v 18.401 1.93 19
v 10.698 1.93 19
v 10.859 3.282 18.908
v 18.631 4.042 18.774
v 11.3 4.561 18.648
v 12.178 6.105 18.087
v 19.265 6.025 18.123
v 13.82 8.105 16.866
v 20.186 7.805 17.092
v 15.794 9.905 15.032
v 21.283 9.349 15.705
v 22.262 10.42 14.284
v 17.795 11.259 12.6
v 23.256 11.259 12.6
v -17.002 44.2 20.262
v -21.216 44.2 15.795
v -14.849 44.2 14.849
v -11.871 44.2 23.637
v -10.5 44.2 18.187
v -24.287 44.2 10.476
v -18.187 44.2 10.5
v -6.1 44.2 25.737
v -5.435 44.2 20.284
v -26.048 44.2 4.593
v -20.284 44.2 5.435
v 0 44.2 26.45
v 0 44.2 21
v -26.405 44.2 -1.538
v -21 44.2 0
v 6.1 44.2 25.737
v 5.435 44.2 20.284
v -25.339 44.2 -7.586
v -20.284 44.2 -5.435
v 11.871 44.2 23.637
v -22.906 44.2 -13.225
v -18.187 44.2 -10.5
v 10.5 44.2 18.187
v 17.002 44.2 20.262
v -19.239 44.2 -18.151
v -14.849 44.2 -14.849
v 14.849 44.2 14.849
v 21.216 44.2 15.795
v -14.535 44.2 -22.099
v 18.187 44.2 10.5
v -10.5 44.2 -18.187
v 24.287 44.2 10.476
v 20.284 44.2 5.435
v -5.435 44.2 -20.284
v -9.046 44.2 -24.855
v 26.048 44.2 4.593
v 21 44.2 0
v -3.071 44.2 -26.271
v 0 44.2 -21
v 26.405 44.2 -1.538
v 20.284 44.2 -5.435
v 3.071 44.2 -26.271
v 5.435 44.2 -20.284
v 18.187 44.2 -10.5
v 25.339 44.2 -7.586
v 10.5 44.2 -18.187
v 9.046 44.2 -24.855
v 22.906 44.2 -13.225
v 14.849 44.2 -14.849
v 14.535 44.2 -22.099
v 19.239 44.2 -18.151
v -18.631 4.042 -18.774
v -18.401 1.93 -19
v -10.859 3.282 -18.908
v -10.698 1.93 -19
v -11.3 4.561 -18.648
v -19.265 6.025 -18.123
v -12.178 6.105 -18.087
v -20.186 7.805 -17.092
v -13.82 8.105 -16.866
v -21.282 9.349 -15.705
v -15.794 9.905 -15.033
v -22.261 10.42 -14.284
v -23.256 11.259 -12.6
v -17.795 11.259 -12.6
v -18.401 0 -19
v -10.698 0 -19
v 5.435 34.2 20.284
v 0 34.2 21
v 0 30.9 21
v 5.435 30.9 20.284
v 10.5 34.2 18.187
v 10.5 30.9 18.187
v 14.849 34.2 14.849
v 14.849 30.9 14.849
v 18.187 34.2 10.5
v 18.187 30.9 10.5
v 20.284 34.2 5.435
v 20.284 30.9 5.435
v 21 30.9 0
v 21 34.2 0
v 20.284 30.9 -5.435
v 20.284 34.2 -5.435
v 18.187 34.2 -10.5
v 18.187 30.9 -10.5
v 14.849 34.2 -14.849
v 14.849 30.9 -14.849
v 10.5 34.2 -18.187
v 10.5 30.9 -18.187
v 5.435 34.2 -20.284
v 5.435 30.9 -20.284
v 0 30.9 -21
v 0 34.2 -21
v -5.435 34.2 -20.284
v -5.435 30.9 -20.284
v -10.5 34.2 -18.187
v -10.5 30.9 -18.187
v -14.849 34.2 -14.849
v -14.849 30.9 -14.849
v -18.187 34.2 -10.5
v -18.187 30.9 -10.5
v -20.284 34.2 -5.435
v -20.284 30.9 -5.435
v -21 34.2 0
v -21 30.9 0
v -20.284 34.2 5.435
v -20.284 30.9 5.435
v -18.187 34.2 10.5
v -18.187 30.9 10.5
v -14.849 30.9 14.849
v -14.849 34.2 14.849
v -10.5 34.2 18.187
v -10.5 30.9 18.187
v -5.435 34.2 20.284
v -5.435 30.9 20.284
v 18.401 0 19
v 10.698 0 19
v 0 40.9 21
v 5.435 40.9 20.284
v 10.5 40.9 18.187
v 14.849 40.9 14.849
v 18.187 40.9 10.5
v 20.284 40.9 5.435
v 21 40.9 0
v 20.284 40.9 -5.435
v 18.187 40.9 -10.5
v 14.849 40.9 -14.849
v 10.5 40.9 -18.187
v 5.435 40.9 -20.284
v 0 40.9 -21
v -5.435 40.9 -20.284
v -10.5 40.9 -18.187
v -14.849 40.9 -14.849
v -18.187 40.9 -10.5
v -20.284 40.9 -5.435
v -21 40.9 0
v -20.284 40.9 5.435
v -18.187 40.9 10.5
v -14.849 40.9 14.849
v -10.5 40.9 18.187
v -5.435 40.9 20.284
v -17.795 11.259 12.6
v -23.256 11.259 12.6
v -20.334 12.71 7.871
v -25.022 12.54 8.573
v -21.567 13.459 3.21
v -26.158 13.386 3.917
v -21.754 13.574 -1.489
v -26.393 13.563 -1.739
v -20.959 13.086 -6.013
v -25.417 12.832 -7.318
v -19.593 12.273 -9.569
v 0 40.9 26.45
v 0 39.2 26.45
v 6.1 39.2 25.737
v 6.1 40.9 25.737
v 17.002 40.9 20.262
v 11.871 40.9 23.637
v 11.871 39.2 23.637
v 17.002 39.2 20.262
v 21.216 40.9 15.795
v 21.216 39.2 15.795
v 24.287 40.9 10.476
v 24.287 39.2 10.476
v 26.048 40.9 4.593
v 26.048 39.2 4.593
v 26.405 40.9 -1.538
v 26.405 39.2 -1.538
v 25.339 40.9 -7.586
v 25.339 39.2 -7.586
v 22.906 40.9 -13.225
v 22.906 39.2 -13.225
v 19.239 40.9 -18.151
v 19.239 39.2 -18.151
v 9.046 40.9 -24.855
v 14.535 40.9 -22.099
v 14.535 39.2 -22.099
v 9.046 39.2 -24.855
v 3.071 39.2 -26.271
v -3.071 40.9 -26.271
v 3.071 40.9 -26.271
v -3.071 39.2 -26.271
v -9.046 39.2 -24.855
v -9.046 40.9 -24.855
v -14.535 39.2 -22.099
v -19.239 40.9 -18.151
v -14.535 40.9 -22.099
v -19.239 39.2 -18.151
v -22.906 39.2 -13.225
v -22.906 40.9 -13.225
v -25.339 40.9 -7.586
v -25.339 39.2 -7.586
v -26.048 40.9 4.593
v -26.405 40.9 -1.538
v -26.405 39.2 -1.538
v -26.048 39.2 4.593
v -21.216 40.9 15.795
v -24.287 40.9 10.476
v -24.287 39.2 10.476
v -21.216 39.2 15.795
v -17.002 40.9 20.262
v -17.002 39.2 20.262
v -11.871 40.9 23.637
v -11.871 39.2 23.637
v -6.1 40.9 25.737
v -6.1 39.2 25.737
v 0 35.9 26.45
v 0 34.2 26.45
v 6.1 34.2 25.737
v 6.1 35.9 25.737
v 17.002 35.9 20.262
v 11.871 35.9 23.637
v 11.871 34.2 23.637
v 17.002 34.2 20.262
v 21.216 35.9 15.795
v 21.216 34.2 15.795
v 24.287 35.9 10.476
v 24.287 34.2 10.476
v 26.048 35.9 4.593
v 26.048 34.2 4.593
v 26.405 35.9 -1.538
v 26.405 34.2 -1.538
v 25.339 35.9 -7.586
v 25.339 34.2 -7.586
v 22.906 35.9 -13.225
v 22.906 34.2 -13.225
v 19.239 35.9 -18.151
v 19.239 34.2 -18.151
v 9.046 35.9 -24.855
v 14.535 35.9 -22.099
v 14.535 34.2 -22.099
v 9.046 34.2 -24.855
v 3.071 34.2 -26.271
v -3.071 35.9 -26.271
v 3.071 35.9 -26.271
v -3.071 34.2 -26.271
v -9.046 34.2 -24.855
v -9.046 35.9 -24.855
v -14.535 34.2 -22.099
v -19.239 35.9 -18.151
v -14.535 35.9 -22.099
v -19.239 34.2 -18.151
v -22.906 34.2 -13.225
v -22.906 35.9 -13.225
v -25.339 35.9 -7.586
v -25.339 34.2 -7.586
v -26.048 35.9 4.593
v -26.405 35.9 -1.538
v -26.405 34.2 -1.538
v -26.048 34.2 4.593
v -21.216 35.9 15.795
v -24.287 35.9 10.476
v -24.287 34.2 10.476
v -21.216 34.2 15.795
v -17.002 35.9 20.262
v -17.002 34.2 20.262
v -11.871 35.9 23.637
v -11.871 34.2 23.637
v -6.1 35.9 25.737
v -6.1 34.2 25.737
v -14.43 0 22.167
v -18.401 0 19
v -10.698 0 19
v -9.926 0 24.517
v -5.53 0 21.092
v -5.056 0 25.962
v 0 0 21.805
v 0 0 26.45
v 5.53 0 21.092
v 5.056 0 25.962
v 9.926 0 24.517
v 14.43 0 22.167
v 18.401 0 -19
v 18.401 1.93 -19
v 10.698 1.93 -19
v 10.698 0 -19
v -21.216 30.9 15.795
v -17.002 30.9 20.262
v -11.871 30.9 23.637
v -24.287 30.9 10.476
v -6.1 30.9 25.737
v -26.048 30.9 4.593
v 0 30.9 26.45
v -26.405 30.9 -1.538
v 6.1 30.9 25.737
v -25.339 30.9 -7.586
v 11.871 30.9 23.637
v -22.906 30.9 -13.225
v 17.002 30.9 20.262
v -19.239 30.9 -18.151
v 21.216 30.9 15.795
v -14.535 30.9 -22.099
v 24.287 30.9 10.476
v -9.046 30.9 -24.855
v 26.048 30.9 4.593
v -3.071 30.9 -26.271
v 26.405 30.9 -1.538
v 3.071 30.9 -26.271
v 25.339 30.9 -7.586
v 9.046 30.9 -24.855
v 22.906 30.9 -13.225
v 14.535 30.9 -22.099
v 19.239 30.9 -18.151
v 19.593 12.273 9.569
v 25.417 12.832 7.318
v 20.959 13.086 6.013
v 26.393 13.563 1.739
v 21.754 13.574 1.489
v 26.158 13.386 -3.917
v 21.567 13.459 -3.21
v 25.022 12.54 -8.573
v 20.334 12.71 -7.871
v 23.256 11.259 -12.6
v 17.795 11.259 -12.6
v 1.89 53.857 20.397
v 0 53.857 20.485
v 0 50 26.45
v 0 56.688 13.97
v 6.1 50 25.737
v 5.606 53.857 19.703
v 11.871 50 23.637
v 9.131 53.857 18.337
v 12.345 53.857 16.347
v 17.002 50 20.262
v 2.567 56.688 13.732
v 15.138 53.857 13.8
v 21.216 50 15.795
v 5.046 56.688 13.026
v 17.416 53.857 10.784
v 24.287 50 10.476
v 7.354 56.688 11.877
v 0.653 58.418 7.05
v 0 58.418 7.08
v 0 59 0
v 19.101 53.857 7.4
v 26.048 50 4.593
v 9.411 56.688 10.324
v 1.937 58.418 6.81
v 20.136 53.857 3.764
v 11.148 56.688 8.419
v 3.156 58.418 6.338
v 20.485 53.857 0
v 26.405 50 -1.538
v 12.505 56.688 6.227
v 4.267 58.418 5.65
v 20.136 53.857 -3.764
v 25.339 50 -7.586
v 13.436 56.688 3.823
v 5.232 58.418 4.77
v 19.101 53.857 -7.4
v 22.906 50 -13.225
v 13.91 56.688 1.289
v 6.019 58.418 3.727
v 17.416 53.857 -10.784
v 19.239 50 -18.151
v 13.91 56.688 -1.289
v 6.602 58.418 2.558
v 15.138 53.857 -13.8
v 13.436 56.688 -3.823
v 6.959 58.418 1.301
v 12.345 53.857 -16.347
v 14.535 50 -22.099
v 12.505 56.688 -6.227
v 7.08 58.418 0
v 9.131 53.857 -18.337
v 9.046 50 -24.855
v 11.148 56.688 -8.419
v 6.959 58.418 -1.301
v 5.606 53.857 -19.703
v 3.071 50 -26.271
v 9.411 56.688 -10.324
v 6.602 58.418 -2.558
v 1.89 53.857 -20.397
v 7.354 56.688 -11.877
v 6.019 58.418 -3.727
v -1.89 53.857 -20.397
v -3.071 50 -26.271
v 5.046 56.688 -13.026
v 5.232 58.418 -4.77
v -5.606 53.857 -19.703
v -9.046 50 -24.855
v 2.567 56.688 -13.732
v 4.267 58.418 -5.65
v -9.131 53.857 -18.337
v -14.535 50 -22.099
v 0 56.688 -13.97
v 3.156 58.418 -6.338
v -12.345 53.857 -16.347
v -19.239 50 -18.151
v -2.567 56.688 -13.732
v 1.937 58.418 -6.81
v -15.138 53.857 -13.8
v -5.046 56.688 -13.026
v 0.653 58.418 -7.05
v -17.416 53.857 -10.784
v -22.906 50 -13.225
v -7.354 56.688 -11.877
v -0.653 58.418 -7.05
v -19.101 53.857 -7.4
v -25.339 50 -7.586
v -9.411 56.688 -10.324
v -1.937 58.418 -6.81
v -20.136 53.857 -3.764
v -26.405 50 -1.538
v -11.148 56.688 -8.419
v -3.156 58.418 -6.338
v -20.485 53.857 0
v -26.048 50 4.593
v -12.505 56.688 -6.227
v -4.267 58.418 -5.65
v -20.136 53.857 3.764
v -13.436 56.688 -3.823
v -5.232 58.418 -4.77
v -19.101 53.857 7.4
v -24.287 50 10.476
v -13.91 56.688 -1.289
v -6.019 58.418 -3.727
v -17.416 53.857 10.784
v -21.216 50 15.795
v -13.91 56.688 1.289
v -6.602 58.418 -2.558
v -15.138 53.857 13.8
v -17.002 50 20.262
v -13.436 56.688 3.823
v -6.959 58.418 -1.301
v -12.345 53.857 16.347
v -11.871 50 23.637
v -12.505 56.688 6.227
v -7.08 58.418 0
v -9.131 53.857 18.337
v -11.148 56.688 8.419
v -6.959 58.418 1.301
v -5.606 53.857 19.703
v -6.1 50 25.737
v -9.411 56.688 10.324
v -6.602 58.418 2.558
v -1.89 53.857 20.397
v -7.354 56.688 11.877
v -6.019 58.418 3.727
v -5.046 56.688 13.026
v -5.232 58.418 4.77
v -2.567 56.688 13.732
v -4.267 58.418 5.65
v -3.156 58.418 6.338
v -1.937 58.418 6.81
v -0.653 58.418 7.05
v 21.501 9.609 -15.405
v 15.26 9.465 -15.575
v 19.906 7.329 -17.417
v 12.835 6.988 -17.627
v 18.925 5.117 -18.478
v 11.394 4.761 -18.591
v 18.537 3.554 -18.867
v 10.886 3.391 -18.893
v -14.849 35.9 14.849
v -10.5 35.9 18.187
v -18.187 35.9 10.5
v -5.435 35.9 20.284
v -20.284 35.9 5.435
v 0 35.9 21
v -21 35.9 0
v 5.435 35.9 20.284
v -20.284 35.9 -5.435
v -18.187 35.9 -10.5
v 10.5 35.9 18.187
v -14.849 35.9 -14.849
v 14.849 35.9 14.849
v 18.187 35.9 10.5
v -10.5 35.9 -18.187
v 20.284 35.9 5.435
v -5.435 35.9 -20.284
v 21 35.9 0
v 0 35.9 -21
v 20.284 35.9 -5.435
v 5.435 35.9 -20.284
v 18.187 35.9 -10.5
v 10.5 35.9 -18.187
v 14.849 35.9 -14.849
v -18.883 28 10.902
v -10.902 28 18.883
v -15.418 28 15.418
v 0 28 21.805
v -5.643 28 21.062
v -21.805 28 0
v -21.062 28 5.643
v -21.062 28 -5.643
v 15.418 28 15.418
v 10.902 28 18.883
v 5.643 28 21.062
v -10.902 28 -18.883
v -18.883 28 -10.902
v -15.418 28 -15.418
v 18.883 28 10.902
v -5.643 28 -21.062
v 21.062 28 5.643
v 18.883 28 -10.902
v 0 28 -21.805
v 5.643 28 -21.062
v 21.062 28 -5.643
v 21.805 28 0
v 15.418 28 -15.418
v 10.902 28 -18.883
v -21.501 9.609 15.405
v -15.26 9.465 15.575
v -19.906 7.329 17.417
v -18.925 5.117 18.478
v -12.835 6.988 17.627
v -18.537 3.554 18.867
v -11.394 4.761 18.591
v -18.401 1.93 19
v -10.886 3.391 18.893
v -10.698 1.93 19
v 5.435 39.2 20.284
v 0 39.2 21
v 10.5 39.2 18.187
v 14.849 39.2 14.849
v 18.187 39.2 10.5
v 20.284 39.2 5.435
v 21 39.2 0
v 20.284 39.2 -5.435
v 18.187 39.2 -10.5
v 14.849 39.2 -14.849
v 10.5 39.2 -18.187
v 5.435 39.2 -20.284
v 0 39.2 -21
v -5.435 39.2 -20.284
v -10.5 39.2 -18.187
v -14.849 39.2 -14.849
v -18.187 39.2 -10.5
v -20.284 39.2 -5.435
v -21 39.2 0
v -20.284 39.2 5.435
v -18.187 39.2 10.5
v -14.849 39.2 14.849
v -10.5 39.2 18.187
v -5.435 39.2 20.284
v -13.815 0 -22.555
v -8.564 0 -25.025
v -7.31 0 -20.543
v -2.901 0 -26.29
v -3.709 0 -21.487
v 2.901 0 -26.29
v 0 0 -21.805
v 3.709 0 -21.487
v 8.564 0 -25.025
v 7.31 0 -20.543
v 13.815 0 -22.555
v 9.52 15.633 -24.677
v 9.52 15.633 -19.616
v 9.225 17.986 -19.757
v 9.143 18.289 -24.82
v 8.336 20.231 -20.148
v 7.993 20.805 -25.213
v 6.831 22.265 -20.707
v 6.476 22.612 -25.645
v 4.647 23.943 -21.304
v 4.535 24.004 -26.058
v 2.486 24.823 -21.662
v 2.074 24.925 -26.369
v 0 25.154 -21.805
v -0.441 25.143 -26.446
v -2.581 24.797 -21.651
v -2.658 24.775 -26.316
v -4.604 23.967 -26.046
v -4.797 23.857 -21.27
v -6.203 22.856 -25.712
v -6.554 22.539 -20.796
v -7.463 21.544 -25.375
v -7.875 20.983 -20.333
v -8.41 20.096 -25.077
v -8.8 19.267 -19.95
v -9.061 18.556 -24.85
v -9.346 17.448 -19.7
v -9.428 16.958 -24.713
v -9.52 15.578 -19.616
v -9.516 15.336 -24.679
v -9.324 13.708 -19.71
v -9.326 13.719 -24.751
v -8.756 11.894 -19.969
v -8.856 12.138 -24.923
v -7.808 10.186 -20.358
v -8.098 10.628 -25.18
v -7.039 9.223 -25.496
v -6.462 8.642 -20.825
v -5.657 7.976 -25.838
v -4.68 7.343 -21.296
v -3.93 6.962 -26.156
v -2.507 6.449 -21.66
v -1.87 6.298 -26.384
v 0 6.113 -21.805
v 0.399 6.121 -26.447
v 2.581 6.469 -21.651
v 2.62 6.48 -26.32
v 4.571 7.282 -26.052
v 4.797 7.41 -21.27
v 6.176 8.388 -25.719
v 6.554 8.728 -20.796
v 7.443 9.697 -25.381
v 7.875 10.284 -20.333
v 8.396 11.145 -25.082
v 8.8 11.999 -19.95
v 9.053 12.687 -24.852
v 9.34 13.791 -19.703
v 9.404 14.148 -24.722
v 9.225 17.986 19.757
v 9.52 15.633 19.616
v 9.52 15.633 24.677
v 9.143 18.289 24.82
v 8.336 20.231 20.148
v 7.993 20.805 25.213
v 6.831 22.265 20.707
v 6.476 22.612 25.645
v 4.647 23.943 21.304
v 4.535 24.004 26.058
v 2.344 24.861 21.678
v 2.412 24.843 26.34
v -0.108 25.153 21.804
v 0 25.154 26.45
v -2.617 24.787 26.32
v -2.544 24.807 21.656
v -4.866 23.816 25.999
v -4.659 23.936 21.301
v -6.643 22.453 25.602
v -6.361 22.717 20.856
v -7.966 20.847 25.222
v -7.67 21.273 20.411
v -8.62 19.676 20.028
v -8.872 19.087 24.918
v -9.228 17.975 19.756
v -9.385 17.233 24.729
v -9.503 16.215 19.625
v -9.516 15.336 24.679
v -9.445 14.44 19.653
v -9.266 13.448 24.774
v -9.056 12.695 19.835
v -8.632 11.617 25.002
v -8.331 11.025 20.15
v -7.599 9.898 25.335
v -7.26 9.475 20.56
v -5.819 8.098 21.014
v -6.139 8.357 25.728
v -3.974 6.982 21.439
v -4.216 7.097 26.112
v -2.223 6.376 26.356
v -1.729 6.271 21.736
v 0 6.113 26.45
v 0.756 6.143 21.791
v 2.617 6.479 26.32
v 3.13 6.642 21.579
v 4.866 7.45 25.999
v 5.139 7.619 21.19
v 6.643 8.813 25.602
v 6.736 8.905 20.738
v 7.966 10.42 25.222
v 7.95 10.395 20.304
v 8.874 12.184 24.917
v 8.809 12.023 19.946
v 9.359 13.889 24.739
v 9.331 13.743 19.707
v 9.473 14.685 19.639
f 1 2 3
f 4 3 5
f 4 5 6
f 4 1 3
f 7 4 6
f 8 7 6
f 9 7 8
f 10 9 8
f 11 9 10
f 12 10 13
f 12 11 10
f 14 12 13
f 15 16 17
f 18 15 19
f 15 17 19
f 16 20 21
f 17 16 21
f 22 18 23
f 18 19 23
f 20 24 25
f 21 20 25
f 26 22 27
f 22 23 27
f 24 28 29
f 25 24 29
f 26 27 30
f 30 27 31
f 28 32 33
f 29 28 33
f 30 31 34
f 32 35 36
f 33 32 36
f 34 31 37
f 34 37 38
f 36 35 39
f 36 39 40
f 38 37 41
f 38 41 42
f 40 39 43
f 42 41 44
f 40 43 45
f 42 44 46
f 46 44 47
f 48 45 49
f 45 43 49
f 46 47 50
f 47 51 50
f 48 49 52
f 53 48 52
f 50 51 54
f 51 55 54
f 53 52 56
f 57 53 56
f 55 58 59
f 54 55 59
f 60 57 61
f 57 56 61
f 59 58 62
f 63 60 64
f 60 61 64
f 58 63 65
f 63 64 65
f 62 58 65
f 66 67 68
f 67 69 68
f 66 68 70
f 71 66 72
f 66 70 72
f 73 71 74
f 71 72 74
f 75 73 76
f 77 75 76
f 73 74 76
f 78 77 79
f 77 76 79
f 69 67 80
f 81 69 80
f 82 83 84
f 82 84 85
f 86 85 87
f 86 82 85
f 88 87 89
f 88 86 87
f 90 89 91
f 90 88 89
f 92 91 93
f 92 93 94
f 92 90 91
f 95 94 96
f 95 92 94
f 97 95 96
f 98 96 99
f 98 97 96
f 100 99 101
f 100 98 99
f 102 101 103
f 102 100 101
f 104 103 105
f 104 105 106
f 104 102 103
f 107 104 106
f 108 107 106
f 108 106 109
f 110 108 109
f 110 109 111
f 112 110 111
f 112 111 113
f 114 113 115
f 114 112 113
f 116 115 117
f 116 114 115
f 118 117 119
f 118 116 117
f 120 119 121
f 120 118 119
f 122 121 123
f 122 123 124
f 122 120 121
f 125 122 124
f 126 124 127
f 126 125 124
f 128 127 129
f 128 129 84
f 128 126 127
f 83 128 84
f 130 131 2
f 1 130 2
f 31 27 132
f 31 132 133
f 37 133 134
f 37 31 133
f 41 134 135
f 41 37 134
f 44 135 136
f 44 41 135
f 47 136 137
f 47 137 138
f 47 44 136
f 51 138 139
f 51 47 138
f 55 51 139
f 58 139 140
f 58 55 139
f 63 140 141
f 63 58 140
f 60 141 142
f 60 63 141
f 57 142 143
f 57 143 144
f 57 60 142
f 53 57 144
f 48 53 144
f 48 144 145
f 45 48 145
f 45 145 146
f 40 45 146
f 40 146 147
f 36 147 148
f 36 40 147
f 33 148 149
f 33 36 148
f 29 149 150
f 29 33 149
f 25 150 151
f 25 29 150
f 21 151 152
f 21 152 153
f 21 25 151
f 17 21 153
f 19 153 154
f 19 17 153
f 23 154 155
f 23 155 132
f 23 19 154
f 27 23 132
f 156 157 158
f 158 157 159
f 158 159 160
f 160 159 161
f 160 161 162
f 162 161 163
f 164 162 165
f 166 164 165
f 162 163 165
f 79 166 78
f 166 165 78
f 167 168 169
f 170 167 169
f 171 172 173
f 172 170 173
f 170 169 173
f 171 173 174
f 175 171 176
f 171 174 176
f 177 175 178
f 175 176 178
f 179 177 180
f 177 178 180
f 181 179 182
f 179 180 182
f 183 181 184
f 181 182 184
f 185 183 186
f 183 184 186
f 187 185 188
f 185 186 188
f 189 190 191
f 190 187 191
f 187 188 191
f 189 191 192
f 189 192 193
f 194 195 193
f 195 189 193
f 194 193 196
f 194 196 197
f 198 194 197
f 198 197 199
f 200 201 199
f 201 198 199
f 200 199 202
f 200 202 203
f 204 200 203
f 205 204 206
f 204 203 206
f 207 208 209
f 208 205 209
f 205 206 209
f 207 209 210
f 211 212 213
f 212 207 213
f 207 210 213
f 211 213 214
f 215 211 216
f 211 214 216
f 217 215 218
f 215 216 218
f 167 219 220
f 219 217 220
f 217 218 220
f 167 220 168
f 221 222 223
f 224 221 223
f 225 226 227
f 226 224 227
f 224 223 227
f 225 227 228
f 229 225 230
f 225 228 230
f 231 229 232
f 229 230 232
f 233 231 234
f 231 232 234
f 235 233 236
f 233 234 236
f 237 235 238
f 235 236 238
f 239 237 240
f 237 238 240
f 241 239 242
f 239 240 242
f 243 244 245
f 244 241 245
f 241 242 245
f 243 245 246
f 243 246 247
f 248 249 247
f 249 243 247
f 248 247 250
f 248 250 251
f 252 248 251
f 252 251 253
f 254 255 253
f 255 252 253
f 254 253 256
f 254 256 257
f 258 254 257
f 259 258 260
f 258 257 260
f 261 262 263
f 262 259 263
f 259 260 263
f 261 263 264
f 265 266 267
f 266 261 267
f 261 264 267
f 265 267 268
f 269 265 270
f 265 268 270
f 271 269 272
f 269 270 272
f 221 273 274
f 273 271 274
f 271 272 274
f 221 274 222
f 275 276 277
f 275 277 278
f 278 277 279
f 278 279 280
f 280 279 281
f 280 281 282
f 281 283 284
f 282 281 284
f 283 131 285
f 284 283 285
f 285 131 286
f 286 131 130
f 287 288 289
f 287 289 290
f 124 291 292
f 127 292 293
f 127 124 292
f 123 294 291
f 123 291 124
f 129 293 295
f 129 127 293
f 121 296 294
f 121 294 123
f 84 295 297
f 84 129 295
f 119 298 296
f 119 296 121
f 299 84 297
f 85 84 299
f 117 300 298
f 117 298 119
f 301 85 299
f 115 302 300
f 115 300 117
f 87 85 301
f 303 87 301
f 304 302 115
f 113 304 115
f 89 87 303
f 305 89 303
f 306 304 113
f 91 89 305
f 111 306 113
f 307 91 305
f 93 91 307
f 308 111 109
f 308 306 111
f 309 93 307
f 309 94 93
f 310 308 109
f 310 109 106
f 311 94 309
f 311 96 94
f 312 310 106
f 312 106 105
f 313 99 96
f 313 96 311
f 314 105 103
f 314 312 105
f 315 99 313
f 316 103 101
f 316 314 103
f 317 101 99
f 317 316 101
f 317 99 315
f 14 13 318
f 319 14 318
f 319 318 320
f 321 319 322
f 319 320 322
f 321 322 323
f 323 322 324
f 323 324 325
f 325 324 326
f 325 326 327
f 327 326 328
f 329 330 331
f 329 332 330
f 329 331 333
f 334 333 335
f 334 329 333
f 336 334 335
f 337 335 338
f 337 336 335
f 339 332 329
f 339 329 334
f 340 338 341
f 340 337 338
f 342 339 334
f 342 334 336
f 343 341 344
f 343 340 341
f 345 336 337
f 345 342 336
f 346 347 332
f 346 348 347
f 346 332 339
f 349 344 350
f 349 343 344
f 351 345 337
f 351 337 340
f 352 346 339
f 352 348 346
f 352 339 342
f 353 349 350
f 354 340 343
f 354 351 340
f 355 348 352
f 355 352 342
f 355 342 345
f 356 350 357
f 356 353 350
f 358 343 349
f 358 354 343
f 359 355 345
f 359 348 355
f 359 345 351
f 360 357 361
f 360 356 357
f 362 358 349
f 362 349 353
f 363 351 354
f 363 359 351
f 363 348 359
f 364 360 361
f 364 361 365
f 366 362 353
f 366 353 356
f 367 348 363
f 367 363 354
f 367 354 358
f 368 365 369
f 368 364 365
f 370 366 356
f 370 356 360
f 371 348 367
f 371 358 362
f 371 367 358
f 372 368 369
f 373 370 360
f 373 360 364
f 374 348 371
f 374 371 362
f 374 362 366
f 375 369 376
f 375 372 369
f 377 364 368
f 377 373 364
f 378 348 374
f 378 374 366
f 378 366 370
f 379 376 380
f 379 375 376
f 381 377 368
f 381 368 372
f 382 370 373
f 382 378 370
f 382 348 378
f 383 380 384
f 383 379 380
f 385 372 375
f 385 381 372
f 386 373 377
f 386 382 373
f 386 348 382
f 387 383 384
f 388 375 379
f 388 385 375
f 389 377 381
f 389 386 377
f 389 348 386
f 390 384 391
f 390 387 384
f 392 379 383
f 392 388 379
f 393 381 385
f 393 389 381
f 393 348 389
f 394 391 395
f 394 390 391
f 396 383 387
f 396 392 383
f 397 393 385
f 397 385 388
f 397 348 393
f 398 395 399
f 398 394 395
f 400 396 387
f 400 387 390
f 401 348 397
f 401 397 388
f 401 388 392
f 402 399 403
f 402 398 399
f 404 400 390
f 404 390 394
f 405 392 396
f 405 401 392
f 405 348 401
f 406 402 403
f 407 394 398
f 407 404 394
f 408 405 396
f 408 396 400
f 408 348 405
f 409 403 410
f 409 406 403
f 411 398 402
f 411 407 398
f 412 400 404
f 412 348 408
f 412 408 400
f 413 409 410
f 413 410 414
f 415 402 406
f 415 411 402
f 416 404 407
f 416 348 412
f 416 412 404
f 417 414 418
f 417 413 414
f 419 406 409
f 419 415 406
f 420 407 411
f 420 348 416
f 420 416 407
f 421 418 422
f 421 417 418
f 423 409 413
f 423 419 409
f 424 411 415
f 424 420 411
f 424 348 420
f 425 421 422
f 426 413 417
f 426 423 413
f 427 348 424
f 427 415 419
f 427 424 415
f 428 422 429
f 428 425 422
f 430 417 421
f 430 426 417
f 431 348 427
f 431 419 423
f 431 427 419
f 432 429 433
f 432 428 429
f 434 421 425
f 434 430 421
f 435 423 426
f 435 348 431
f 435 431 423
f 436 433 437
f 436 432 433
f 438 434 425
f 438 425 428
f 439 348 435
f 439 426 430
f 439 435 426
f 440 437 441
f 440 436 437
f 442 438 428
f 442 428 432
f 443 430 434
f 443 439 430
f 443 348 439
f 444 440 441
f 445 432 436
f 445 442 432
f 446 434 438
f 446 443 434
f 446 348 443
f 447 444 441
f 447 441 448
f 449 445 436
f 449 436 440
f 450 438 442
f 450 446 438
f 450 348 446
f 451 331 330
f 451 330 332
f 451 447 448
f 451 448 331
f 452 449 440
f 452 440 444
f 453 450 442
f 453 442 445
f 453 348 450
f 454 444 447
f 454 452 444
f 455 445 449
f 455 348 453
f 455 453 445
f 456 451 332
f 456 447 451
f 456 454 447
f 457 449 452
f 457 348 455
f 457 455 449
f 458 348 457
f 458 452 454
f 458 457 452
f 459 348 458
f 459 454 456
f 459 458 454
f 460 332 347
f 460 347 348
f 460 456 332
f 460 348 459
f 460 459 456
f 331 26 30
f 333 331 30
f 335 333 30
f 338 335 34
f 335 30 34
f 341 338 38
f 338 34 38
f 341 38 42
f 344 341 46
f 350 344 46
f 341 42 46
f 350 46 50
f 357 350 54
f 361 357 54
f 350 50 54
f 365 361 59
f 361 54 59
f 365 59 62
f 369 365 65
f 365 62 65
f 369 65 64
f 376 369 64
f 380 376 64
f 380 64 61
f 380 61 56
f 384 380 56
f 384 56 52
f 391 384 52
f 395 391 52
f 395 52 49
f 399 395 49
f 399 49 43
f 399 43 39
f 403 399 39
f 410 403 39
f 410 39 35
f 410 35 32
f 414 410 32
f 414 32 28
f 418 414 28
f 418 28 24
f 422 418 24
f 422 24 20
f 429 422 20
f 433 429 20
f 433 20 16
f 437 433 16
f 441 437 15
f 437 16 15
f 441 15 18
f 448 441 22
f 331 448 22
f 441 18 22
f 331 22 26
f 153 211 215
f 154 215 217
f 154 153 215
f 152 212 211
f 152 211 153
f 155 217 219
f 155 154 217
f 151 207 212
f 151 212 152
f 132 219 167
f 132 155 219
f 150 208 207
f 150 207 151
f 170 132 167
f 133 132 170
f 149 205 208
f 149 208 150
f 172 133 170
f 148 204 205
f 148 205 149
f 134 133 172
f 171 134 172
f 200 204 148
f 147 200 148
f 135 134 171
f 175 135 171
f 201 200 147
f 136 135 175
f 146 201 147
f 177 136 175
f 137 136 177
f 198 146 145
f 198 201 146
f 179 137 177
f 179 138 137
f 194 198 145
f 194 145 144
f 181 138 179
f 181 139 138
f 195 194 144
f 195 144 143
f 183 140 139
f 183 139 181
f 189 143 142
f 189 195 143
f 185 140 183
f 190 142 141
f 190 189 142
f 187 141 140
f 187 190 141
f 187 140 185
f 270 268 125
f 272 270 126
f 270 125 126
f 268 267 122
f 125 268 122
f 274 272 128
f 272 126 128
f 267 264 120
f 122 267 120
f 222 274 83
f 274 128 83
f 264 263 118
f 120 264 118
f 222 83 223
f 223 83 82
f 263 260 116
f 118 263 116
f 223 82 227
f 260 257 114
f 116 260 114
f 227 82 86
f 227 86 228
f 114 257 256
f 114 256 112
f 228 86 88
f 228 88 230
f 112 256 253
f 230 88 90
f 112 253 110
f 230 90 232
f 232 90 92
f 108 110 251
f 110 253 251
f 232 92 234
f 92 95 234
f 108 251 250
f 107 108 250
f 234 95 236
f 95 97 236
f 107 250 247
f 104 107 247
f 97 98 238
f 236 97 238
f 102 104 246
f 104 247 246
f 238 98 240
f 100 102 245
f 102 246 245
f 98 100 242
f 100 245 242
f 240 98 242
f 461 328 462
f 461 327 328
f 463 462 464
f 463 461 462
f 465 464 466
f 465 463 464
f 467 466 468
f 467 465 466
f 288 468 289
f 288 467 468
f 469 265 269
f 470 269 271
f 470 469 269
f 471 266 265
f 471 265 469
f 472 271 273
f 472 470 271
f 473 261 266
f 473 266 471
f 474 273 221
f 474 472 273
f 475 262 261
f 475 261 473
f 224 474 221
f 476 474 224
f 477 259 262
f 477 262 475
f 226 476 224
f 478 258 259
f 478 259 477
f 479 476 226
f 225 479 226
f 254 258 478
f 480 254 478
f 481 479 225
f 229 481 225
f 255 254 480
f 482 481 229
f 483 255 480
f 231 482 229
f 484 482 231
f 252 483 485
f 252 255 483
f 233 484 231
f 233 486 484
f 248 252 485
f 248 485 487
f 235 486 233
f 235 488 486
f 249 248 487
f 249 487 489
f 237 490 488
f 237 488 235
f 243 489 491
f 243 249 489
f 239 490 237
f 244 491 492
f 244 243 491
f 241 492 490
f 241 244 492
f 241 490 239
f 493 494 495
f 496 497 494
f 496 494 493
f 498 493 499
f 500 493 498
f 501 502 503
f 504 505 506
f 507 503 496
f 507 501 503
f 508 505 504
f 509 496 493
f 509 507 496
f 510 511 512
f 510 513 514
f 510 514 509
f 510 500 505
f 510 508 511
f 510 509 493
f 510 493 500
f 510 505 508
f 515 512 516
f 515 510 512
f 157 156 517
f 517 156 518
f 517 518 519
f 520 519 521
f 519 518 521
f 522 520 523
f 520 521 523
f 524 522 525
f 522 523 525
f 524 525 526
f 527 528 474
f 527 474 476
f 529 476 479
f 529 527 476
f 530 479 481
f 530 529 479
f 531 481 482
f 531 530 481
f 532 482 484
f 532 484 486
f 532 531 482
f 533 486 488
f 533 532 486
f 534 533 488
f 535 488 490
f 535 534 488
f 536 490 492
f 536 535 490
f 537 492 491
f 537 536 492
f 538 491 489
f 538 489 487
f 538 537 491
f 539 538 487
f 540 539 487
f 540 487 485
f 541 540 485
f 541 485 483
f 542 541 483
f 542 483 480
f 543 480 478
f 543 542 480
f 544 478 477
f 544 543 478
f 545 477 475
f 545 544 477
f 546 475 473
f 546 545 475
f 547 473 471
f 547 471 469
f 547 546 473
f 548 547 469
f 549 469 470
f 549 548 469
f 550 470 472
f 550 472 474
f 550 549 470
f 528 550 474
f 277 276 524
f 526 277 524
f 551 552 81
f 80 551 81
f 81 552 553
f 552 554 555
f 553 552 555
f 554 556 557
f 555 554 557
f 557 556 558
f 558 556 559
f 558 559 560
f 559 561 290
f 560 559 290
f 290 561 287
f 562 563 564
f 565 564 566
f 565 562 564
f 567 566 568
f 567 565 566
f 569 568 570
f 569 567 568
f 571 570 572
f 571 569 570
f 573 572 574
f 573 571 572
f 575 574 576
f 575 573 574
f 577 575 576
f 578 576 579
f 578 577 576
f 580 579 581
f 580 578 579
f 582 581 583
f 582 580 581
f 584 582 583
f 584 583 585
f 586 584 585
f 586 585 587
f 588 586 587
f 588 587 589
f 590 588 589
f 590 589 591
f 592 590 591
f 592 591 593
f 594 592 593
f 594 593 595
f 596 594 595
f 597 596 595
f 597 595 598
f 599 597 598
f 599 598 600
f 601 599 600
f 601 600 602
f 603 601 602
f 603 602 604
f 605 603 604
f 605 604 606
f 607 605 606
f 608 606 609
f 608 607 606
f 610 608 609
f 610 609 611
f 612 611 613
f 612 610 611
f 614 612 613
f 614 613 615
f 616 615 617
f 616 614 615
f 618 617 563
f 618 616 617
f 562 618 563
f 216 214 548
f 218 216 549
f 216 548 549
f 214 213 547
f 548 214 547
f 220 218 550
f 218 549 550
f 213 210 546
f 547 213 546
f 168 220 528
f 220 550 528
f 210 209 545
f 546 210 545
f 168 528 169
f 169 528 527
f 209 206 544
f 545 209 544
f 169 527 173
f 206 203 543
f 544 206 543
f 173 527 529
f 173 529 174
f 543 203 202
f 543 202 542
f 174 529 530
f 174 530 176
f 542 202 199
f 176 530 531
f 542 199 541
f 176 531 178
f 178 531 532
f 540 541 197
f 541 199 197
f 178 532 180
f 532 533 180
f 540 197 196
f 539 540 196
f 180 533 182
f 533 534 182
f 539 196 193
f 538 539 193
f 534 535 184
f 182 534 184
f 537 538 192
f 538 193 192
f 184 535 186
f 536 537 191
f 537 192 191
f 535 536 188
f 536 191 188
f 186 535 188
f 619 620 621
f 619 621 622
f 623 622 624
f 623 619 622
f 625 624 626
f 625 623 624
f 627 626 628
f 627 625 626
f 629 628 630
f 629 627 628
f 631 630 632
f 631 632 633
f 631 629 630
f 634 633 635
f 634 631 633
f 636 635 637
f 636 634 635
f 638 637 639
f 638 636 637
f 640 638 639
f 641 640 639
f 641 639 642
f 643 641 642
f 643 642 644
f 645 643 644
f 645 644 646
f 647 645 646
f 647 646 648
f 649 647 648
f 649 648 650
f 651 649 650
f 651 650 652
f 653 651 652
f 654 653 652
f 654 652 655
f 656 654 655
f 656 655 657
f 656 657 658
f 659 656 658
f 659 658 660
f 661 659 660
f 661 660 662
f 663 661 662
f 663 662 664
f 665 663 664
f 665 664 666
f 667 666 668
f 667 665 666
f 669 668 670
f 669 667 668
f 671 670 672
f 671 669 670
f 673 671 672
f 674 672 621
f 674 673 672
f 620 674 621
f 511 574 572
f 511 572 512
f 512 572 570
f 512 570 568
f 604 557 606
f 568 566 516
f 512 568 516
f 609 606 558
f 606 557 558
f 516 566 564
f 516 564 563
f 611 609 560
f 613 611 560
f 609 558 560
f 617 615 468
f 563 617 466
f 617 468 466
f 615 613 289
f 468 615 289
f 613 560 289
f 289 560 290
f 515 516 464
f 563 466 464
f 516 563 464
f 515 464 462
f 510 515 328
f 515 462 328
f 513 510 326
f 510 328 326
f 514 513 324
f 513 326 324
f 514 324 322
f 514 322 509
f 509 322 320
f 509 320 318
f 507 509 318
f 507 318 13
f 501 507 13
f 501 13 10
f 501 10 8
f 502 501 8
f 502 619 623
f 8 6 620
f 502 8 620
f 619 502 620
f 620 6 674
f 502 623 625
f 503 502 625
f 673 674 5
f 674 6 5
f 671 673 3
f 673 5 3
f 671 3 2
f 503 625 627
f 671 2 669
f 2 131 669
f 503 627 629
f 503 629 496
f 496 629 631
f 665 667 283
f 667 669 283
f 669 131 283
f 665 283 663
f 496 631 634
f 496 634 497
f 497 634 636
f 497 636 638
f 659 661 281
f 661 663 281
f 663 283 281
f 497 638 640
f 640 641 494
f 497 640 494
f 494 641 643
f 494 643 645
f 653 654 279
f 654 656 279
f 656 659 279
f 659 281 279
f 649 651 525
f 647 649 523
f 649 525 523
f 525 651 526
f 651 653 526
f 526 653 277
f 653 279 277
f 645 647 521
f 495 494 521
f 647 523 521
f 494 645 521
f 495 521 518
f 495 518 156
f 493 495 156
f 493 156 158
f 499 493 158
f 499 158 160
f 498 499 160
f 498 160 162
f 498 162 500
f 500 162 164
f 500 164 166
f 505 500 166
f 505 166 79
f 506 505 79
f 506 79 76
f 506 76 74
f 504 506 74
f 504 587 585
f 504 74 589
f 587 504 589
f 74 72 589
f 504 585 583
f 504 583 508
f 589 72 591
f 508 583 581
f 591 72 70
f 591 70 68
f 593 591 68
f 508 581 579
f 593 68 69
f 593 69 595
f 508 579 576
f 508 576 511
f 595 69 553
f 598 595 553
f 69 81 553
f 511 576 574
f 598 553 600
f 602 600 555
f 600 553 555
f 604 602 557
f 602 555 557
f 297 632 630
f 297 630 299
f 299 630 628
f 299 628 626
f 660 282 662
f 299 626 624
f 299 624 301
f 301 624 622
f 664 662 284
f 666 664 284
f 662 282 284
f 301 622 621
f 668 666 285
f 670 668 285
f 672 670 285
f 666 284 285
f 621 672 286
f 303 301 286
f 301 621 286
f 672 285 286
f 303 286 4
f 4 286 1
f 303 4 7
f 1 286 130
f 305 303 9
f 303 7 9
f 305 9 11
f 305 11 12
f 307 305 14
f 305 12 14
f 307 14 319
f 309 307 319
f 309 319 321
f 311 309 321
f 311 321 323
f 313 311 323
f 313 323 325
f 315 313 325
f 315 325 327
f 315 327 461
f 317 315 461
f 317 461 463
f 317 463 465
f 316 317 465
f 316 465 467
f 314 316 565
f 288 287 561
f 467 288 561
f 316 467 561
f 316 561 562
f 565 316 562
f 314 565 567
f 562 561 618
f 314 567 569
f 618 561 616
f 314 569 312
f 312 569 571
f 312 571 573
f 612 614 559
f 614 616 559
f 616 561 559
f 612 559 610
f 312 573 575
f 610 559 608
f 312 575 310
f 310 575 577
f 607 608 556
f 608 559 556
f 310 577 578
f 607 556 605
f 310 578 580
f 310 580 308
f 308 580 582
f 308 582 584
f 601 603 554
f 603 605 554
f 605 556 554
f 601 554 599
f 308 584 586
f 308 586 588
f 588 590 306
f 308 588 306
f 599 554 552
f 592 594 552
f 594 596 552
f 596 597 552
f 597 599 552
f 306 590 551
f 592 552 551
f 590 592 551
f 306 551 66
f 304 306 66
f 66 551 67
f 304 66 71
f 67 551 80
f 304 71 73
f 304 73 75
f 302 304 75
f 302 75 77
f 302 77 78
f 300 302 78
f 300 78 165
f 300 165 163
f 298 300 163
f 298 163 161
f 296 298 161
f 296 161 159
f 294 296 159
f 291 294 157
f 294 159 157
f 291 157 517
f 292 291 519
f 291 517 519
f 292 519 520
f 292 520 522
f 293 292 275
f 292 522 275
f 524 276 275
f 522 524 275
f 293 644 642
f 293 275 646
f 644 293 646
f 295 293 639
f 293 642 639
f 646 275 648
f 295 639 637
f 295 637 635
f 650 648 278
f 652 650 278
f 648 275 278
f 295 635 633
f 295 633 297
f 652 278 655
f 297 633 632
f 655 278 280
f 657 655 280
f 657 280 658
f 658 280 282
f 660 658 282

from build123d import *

# Parameters (mm, degrees)
SKETCH1_R               = 26.45
BOSS_EXTRUDE1_DEPTH     = 50
CUT_EXTRUDE2_START      = -5.8
SKETCH2_OUTSIDE_W       = 72.896
SKETCH2_OUTSIDE_H       = 72.896
SKETCH2_OUTSIDE_R       = 21
CUT_EXTRUDE2_DEPTH      = 3.3
LPATTERN1_COUNT         = 3
LPATTERN1_PITCH         = 5
SKETCH5_R               = 21.804512809
CUT_EXTRUDE4_DEPTH      = 28
DOME1_FACE_RADIUS       = 26.45
DOME1_HEIGHT            = 9
CUT_EXTRUDE5_DEPTH      = 70.858464054
CUT_EXTRUDE5_DEPTH_BACK = 70.858464054
SKETCH6_R               = 9.520481224
CUT_EXTRUDE6_DEPTH      = 70.85846413
CUT_EXTRUDE6_DEPTH_BACK = 70.85846413
FILLET1_R               = 10
FILLET2_R               = 10


with BuildPart() as part:
    # Sketch1 → Boss-Extrude1 (new body)
    with BuildSketch(Plane(origin=(0, 0, 0), x_dir=(1, 0, 0), z_dir=(0, 1, 0))):
        with Locations(Location((0, 0, 0), (0, 0, 270))):
            Circle(SKETCH1_R)
    extrude(amount=BOSS_EXTRUDE1_DEPTH)

    # Sketch2 outside → Cut-Extrude2 (cut)
    with BuildSketch(Plane(origin=(0, 50, 0), x_dir=(1, 0, 0), z_dir=(0, 1, 0)).offset(CUT_EXTRUDE2_START)):
        Rectangle(SKETCH2_OUTSIDE_W, SKETCH2_OUTSIDE_H)
        with Locations(Location((0, 0, 0), (0, 0, 270))):
            Circle(SKETCH2_OUTSIDE_R, mode=Mode.SUBTRACT)
    cut_extrude2 = extrude(amount=-CUT_EXTRUDE2_DEPTH, mode=Mode.SUBTRACT)

    # LPattern1: Cut-Extrude2 ×3
    with Locations(*[(0, -i * LPATTERN1_PITCH, 0) for i in range(1, LPATTERN1_COUNT)]):
        add(cut_extrude2, mode=Mode.SUBTRACT)

    # Sketch5 → Cut-Extrude4 (cut)
    with BuildSketch(Plane.XZ):
        with Locations(Location((0, 0, 0), (0, 0, 270))):
            Circle(SKETCH5_R)
    extrude(amount=-CUT_EXTRUDE4_DEPTH, mode=Mode.SUBTRACT)

    # Dome1: a dome of height H over a round flat face of radius A is a cap of a sphere of radius (A * A + H * H) / (2 * H)
    dome1_r = (DOME1_FACE_RADIUS * DOME1_FACE_RADIUS + DOME1_HEIGHT * DOME1_HEIGHT) / (2 * DOME1_HEIGHT)
    dome1_base = Plane((0, 50, 0), z_dir=(0, 1, 0))
    with Locations(dome1_base.offset(DOME1_HEIGHT - dome1_r)):
        dome1_ball = Sphere(dome1_r, mode=Mode.PRIVATE)
    add(split(dome1_ball, bisect_by=dome1_base, keep=Keep.TOP, mode=Mode.PRIVATE))

    # Sketch6 → Cut-Extrude5 (cut, two sides: drawn at the far end of the back side and taken through both)
    with BuildSketch(Plane.XY.offset(-CUT_EXTRUDE5_DEPTH_BACK)):
        with Locations((0, 15.633194444)):
            Circle(SKETCH6_R)
    extrude(amount=CUT_EXTRUDE5_DEPTH + CUT_EXTRUDE5_DEPTH_BACK, mode=Mode.SUBTRACT)

    # Sketch8 → Cut-Extrude6 (cut, two sides: drawn at the far end of the back side and taken through both)
    with BuildSketch(Plane(origin=(0, 0, 0), x_dir=(0, 0, -1), z_dir=(1, 0, 0)).offset(-CUT_EXTRUDE6_DEPTH_BACK)):
        with BuildLine():
            Line((-19, 0), (-19, 8))
            ThreePointArc((-19, 8), (0, 13.606123087), (19, 8))
            Line((19, 8), (19, 0))
            Line((19, 0), (-19, 0))
        make_face()
    extrude(amount=CUT_EXTRUDE6_DEPTH + CUT_EXTRUDE6_DEPTH_BACK, mode=Mode.SUBTRACT)

    # Fillet1
    fillet1_edges = [part.edges().sort_by_distance(p)[0] for p in [
        (14.549333798, 8, -19),
        (14.549333798, 8, 19),
    ]]
    fillet(fillet1_edges, radius=FILLET1_R)

    # Fillet2
    fillet2_edges = [part.edges().sort_by_distance(p)[0] for p in [
        (-14.549333798, 8, 19),
        (-14.549333798, 8, -19),
    ]]
    fillet(fillet2_edges, radius=FILLET2_R)


solid = part.part
